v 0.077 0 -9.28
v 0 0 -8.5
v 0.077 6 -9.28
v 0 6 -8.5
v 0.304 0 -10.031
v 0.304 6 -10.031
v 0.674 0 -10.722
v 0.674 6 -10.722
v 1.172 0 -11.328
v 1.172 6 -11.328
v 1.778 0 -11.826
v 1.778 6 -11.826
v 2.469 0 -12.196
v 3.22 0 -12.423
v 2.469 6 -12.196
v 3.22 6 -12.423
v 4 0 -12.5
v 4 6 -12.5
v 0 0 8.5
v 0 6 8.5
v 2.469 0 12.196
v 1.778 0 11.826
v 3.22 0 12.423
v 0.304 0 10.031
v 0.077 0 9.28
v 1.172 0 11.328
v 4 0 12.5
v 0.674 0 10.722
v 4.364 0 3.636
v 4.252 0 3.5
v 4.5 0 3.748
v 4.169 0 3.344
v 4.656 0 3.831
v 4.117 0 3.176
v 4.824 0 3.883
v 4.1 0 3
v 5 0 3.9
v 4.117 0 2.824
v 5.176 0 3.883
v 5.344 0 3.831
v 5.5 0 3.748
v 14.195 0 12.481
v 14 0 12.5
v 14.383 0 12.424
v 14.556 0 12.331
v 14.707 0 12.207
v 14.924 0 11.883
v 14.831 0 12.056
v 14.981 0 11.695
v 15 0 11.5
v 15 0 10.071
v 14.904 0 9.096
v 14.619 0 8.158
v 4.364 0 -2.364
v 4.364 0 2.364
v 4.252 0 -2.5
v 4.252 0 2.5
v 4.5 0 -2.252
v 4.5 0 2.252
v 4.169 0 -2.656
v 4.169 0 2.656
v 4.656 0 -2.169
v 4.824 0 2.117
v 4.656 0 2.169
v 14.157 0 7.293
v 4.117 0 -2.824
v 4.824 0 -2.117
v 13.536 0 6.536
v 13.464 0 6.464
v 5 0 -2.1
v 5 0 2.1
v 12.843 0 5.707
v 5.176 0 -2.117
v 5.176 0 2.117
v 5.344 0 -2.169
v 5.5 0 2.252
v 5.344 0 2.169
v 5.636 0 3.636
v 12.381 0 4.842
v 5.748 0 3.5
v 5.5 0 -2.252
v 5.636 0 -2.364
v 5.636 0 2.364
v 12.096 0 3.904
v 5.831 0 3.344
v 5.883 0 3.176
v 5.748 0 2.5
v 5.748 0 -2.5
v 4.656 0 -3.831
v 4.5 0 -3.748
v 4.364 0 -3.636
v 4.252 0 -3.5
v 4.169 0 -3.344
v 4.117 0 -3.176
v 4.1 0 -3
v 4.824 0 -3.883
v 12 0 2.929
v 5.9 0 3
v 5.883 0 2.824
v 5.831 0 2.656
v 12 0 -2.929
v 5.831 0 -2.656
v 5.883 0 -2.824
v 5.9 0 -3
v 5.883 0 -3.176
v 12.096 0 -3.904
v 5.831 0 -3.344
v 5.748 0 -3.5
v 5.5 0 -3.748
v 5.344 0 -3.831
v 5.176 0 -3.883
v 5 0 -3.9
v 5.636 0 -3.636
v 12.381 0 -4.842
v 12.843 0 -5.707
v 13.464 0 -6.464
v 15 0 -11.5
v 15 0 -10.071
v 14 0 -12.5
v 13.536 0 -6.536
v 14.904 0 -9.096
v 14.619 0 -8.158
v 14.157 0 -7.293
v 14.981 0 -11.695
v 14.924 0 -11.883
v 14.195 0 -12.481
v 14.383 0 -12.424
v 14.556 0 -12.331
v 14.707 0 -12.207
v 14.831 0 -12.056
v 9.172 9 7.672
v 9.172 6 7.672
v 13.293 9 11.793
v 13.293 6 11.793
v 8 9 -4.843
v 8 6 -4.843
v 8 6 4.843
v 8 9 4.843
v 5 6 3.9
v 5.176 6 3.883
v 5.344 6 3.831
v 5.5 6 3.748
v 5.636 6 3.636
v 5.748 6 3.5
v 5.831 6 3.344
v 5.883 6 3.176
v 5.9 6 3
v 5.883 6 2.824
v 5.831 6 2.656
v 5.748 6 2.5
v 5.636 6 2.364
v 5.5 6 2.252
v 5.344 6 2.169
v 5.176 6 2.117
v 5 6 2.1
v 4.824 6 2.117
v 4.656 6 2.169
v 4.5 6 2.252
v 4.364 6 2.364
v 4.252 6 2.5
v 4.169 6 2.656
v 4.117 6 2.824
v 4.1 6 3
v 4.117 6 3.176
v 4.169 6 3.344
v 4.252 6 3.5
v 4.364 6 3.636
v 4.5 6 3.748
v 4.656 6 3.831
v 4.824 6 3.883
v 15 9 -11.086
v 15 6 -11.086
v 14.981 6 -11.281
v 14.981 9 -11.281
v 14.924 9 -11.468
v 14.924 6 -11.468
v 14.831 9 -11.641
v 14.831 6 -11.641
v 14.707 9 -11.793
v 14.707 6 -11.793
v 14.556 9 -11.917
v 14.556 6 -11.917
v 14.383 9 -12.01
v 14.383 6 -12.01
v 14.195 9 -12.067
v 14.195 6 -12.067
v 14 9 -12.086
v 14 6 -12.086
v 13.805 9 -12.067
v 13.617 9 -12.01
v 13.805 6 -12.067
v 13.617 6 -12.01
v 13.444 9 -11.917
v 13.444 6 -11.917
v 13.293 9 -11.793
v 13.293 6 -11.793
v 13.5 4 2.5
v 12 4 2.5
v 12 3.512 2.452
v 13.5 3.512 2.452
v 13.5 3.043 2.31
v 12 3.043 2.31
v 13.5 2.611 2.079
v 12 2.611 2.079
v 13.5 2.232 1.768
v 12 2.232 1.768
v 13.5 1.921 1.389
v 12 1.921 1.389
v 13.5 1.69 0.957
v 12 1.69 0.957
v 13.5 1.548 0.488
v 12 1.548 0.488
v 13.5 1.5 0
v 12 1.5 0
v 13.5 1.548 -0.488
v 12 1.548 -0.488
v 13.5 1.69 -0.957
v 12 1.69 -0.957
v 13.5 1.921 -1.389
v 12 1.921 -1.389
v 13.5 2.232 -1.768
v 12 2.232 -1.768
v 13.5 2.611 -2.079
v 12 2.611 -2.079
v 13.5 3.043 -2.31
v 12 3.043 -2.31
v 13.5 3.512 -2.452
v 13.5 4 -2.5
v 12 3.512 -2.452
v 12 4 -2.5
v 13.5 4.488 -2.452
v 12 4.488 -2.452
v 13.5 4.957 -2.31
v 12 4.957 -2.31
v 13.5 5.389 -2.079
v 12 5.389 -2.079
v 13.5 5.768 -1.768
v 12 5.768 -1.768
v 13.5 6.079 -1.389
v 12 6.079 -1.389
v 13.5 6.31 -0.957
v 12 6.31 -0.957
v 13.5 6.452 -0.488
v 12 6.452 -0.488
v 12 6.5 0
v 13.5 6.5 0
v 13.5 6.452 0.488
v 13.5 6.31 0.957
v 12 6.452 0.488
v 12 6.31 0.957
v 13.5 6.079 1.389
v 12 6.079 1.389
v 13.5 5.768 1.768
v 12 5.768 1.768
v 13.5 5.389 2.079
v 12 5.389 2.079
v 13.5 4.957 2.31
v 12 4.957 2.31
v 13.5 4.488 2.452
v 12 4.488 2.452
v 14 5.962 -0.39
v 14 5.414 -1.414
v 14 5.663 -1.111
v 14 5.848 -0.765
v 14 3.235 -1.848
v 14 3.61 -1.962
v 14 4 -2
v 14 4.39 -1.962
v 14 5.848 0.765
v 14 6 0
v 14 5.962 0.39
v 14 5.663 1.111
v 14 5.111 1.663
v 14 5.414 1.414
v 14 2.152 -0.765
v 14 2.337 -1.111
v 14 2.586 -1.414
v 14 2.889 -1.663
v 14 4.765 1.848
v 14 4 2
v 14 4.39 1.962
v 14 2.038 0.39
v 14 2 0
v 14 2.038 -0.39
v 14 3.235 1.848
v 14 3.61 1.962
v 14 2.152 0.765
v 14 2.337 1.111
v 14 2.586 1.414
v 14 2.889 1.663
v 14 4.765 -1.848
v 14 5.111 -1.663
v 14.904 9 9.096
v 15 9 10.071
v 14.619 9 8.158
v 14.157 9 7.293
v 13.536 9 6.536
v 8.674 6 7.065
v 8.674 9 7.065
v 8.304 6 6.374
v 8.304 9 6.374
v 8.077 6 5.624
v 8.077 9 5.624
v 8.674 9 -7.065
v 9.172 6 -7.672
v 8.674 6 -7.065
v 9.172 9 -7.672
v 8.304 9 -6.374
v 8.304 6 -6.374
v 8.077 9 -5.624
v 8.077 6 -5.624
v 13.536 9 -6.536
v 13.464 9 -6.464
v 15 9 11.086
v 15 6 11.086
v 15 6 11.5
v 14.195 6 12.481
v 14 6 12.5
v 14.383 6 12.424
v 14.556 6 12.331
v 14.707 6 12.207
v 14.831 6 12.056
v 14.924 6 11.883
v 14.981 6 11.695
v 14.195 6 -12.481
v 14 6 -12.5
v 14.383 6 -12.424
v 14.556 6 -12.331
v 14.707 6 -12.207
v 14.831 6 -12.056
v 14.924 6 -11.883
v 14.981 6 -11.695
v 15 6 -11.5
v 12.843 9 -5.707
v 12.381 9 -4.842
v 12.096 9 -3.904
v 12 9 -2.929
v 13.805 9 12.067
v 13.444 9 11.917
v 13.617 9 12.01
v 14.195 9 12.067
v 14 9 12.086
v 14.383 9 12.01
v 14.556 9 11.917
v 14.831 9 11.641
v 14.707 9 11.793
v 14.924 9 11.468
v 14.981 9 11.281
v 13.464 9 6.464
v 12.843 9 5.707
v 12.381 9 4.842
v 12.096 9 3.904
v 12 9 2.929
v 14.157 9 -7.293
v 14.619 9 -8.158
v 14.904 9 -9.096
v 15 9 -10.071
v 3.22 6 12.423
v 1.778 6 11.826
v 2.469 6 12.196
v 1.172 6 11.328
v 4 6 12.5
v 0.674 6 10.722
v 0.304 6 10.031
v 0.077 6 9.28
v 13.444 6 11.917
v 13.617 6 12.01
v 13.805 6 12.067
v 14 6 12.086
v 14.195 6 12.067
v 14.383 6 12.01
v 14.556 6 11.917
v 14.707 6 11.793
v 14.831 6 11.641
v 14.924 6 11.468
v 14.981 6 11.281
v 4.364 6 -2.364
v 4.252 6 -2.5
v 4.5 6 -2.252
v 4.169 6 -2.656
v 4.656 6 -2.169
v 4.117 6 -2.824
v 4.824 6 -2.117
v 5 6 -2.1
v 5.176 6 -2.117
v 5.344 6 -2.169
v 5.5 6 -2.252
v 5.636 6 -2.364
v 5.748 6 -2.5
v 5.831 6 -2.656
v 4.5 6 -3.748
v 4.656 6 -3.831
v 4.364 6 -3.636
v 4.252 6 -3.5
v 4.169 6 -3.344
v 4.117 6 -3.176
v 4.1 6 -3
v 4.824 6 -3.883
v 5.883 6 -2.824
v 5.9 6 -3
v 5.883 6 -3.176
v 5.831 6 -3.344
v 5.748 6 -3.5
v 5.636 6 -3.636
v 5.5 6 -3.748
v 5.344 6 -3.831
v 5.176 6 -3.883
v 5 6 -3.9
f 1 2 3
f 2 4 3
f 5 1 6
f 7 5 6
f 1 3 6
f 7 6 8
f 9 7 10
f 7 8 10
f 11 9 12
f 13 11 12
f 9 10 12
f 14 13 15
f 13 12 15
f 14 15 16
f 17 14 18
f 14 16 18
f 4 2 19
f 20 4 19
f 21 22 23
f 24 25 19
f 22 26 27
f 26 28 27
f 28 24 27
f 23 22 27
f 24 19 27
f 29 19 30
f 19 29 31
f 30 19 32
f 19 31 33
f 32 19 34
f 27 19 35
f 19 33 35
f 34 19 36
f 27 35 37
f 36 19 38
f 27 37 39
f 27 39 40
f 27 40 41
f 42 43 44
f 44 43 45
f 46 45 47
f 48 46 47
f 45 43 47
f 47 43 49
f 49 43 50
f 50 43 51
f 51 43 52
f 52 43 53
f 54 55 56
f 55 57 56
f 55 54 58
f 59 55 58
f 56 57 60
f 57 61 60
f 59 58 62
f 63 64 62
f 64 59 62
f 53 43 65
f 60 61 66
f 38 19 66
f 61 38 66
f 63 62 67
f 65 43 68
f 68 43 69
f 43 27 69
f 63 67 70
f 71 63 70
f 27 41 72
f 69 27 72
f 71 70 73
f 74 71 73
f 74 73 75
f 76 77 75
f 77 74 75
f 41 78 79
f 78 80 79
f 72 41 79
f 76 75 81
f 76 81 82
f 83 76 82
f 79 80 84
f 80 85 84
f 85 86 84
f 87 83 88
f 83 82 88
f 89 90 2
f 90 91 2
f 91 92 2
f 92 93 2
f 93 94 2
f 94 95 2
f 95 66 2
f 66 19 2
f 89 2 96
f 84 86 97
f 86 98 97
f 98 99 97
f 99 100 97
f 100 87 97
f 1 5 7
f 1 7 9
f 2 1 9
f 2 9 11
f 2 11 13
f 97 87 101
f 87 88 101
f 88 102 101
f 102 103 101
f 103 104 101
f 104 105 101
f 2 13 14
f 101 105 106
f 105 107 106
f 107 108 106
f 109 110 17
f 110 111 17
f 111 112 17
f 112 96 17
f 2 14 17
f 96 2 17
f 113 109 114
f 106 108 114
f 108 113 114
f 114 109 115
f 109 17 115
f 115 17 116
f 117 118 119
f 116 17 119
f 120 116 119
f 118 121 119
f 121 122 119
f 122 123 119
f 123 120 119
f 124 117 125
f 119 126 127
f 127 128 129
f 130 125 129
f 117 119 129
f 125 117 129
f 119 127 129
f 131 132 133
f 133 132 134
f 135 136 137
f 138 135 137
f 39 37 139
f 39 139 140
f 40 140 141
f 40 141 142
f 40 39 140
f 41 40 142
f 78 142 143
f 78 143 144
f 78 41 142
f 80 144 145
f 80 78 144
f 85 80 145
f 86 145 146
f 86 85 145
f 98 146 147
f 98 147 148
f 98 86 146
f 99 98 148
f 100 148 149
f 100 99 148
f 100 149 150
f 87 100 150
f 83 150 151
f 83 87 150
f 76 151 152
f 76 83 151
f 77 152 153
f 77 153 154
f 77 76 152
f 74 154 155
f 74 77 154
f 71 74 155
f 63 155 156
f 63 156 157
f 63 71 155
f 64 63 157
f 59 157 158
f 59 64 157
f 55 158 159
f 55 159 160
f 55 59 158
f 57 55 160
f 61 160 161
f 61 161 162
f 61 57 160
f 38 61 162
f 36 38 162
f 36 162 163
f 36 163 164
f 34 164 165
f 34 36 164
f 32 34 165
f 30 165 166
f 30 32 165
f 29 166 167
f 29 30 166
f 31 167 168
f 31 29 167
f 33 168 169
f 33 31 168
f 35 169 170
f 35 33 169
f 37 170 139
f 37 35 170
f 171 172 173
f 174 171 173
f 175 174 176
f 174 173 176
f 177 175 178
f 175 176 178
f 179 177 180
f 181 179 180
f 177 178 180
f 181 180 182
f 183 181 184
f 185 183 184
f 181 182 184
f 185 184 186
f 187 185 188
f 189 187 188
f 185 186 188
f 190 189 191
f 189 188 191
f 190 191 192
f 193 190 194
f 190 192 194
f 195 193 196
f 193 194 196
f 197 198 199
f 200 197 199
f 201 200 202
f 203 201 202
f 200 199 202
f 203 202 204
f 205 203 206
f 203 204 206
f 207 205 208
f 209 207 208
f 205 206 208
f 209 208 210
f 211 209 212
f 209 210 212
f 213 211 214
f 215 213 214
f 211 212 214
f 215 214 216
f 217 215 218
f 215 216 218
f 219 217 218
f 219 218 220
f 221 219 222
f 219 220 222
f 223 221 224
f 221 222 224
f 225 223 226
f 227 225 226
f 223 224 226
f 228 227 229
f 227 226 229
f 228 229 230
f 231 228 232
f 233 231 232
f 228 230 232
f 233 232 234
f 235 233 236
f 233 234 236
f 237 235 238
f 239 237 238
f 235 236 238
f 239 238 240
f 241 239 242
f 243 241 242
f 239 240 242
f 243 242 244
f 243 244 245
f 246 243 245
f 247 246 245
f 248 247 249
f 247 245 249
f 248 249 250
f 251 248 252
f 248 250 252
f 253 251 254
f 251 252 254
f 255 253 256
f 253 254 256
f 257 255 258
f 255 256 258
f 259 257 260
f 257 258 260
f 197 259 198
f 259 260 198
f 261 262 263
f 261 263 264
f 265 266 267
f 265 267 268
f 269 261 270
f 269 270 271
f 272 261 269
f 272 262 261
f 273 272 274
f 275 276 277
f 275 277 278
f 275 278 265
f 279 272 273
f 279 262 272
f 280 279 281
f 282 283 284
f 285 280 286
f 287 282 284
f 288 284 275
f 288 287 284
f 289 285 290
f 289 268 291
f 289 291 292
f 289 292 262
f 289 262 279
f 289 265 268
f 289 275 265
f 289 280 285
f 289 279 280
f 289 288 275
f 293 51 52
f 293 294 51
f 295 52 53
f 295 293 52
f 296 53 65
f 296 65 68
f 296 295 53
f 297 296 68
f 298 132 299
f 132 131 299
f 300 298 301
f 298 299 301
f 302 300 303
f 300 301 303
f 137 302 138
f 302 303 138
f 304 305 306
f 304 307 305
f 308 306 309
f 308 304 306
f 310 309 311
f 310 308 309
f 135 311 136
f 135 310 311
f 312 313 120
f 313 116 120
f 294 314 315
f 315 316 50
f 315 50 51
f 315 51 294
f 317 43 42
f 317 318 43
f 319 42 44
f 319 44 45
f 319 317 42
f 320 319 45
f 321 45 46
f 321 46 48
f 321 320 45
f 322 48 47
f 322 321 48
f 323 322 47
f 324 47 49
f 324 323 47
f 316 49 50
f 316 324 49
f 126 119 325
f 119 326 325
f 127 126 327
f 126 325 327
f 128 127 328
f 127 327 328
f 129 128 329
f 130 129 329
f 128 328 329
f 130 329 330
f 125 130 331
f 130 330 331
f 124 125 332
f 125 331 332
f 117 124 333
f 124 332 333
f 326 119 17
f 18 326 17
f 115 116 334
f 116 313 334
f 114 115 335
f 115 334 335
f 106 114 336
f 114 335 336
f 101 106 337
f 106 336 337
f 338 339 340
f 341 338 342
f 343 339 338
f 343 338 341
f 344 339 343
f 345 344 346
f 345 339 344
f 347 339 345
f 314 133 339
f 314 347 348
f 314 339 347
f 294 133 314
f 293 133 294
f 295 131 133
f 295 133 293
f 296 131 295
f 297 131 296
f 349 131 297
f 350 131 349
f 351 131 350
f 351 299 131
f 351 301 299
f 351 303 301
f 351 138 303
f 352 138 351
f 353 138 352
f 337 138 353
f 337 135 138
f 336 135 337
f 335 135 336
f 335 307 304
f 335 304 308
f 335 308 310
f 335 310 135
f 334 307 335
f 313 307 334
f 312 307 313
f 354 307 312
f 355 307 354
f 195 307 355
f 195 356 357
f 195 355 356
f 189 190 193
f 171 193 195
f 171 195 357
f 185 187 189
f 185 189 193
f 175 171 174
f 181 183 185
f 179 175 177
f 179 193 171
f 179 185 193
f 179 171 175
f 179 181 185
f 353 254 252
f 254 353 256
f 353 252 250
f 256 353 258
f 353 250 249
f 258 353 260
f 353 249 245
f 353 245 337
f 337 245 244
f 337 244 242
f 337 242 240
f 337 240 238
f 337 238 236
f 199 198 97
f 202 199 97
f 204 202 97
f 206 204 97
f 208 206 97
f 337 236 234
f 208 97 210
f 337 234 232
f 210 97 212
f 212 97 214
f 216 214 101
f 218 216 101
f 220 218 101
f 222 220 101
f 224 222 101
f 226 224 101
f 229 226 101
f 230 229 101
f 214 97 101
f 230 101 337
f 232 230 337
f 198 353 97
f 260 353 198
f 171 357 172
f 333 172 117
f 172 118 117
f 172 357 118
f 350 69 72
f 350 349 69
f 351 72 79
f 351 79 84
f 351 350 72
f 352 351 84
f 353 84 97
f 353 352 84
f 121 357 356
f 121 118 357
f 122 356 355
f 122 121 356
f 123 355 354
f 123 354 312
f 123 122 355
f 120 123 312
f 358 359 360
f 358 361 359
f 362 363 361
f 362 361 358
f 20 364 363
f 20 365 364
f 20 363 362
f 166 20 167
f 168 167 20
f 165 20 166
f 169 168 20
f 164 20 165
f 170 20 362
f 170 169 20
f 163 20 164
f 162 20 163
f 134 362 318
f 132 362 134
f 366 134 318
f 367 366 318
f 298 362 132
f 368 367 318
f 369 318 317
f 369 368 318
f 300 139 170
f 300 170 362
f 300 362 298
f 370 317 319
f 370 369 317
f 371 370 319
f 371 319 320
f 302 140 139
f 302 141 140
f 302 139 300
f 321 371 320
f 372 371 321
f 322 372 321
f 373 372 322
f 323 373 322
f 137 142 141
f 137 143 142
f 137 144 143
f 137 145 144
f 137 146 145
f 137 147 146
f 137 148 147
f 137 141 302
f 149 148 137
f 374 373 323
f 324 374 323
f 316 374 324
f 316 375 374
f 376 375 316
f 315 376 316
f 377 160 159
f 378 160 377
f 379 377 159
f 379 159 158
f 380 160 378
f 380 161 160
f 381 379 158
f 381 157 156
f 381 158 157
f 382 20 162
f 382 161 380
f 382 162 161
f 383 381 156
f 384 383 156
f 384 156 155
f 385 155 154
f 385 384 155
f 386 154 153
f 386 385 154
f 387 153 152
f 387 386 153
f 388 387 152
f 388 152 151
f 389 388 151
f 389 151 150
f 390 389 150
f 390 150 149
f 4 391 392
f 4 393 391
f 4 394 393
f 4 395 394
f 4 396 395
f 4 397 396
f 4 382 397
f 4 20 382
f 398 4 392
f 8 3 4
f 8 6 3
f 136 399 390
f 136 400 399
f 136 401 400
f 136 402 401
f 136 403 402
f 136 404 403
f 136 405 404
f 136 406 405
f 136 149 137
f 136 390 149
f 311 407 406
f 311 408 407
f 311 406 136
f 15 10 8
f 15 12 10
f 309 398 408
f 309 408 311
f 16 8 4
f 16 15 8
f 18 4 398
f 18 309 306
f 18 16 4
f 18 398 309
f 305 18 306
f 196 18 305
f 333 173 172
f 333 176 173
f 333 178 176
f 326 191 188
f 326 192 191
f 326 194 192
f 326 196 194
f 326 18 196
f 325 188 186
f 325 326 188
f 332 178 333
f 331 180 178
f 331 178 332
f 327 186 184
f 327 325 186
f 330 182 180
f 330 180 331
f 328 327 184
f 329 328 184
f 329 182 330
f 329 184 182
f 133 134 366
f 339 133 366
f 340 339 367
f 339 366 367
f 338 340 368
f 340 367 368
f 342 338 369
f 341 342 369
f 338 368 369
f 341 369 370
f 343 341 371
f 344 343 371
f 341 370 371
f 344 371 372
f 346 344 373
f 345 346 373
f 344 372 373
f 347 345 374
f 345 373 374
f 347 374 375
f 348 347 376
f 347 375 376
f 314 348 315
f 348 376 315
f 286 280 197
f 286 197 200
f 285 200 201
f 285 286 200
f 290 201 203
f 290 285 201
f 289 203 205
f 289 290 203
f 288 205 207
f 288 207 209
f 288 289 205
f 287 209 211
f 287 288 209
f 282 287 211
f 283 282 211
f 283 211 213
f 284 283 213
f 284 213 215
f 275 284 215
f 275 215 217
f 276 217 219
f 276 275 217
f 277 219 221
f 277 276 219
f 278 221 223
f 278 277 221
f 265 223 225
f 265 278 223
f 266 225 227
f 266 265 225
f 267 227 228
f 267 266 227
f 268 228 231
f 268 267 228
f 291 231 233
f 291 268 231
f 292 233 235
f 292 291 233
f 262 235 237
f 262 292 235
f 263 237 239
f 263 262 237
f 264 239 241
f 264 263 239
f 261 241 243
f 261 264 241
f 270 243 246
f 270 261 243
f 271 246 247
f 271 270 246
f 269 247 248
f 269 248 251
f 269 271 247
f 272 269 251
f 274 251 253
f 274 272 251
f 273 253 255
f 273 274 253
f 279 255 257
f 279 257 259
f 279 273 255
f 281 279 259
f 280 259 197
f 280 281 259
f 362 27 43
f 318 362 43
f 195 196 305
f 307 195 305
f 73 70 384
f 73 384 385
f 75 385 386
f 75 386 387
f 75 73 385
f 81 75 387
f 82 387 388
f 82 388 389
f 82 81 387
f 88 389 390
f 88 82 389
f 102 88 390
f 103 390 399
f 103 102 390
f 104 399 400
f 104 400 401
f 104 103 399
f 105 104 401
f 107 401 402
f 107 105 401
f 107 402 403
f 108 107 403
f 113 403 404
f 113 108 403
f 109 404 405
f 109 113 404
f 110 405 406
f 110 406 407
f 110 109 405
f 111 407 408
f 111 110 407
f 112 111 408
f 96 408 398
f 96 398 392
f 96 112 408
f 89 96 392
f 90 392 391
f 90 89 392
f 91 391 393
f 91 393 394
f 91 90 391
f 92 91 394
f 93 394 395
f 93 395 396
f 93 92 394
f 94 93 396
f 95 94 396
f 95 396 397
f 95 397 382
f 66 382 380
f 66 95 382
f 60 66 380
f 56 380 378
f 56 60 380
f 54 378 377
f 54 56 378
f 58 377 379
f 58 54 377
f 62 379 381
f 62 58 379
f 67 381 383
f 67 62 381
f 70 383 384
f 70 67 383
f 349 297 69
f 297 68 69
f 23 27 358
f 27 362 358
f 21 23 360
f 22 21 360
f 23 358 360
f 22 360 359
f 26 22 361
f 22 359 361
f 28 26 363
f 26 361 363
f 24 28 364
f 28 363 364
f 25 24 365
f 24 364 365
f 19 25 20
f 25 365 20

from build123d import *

# Parameters (mm, degrees)
SKETCH_1_R      = 0.9
EXTRUDE_1_DEPTH = 6
EXTRUDE_2_DEPTH = 3
FILLET_2_R      = 4
FILLET_3_R      = 1
SKETCH_3_R      = 2.5
EXTRUDE_3_DEPTH = 2
FILLET_4_R      = 5
CHAMFER_1_SIZE  = 0.5


with BuildPart() as part:
    # 草图1 → 凸台-拉伸1 (new body)
    with BuildSketch(Plane(origin=(0, 0, 0), x_dir=(1, 0, 0), z_dir=(0, 1, 0))):
        Polygon((0, 12.5), (0, -12.5), (15, -12.5), (15, -8), (12, -5), (12, 5), (15, 8), (15, 12.5), align=None)
        with Locations(Location((5, 3, 0), (0, 0, 270))):
            Circle(SKETCH_1_R, mode=Mode.SUBTRACT)
        with Locations(Location((5, -3, 0), (0, 0, 270))):
            Circle(SKETCH_1_R, mode=Mode.SUBTRACT)
    extrude(amount=EXTRUDE_1_DEPTH)

    # 草图2 → 凸台-拉伸2 (add)
    with BuildSketch(Plane(origin=(0, 6, 0), x_dir=(1, 0, 0), z_dir=(0, 1, 0))):
        with BuildLine():
            Line((13.292893219, 11.792893219), (8, 6.5))
            Line((8, 6.5), (8, -6.5))
            Line((8, -6.5), (13.292893219, -11.792893219))
            ThreePointArc((13.292893219, -11.792893219), (14.382683432, -12.00966597), (15, -11.085786438))
            Line((15, -11.085786438), (15, -8))
            Line((15, -8), (12, -5))
            Line((12, -5), (12, 5))
            Line((12, 5), (15, 8))
            Line((15, 8), (15, 11.085786438))
            ThreePointArc((15, 11.085786438), (14.382683432, 12.00966597), (13.292893219, 11.792893219))
        make_face()
    extrude(amount=EXTRUDE_2_DEPTH)

    # 圆角2
    fillet_2_edges = [part.edges().sort_by_distance(p)[0] for p in [
        (0, 3, 12.5),
        (0, 3, -12.5),
        (8, 7.5, -6.5),
        (8, 7.5, 6.5),
    ]]
    fillet(fillet_2_edges, radius=FILLET_2_R)

    # 圆角3
    fillet_3_edges = [part.edges().sort_by_distance(p)[0] for p in [
        (15, 3, -12.5),
        (15, 3, 12.5),
    ]]
    fillet(fillet_3_edges, radius=FILLET_3_R)

    # 草图3 → 凸台-拉伸3 (add)
    with BuildSketch(Plane(origin=(12, 0, 0), x_dir=(0, 0, -1), z_dir=(1, 0, 0))):
        with Locations(Location((0, 4, 0), (0, 0, 180))):
            Circle(SKETCH_3_R)
    extrude(amount=EXTRUDE_3_DEPTH)

    # 圆角4
    fillet_4_edges = [part.edges().sort_by_distance(p)[0] for p in [
        (15, 4.5, -8),
        (12, 4.5, -5),
        (12, 4.5, 5),
        (15, 4.5, 8),
    ]]
    fillet(fillet_4_edges, radius=FILLET_4_R)

    # 倒角1
    chamfer_1_edges = [part.edges().sort_by_distance(p)[0] for p in [
        (14, 4, -2.5),
    ]]
    chamfer(chamfer_1_edges, length=CHAMFER_1_SIZE)


solid = part.part
